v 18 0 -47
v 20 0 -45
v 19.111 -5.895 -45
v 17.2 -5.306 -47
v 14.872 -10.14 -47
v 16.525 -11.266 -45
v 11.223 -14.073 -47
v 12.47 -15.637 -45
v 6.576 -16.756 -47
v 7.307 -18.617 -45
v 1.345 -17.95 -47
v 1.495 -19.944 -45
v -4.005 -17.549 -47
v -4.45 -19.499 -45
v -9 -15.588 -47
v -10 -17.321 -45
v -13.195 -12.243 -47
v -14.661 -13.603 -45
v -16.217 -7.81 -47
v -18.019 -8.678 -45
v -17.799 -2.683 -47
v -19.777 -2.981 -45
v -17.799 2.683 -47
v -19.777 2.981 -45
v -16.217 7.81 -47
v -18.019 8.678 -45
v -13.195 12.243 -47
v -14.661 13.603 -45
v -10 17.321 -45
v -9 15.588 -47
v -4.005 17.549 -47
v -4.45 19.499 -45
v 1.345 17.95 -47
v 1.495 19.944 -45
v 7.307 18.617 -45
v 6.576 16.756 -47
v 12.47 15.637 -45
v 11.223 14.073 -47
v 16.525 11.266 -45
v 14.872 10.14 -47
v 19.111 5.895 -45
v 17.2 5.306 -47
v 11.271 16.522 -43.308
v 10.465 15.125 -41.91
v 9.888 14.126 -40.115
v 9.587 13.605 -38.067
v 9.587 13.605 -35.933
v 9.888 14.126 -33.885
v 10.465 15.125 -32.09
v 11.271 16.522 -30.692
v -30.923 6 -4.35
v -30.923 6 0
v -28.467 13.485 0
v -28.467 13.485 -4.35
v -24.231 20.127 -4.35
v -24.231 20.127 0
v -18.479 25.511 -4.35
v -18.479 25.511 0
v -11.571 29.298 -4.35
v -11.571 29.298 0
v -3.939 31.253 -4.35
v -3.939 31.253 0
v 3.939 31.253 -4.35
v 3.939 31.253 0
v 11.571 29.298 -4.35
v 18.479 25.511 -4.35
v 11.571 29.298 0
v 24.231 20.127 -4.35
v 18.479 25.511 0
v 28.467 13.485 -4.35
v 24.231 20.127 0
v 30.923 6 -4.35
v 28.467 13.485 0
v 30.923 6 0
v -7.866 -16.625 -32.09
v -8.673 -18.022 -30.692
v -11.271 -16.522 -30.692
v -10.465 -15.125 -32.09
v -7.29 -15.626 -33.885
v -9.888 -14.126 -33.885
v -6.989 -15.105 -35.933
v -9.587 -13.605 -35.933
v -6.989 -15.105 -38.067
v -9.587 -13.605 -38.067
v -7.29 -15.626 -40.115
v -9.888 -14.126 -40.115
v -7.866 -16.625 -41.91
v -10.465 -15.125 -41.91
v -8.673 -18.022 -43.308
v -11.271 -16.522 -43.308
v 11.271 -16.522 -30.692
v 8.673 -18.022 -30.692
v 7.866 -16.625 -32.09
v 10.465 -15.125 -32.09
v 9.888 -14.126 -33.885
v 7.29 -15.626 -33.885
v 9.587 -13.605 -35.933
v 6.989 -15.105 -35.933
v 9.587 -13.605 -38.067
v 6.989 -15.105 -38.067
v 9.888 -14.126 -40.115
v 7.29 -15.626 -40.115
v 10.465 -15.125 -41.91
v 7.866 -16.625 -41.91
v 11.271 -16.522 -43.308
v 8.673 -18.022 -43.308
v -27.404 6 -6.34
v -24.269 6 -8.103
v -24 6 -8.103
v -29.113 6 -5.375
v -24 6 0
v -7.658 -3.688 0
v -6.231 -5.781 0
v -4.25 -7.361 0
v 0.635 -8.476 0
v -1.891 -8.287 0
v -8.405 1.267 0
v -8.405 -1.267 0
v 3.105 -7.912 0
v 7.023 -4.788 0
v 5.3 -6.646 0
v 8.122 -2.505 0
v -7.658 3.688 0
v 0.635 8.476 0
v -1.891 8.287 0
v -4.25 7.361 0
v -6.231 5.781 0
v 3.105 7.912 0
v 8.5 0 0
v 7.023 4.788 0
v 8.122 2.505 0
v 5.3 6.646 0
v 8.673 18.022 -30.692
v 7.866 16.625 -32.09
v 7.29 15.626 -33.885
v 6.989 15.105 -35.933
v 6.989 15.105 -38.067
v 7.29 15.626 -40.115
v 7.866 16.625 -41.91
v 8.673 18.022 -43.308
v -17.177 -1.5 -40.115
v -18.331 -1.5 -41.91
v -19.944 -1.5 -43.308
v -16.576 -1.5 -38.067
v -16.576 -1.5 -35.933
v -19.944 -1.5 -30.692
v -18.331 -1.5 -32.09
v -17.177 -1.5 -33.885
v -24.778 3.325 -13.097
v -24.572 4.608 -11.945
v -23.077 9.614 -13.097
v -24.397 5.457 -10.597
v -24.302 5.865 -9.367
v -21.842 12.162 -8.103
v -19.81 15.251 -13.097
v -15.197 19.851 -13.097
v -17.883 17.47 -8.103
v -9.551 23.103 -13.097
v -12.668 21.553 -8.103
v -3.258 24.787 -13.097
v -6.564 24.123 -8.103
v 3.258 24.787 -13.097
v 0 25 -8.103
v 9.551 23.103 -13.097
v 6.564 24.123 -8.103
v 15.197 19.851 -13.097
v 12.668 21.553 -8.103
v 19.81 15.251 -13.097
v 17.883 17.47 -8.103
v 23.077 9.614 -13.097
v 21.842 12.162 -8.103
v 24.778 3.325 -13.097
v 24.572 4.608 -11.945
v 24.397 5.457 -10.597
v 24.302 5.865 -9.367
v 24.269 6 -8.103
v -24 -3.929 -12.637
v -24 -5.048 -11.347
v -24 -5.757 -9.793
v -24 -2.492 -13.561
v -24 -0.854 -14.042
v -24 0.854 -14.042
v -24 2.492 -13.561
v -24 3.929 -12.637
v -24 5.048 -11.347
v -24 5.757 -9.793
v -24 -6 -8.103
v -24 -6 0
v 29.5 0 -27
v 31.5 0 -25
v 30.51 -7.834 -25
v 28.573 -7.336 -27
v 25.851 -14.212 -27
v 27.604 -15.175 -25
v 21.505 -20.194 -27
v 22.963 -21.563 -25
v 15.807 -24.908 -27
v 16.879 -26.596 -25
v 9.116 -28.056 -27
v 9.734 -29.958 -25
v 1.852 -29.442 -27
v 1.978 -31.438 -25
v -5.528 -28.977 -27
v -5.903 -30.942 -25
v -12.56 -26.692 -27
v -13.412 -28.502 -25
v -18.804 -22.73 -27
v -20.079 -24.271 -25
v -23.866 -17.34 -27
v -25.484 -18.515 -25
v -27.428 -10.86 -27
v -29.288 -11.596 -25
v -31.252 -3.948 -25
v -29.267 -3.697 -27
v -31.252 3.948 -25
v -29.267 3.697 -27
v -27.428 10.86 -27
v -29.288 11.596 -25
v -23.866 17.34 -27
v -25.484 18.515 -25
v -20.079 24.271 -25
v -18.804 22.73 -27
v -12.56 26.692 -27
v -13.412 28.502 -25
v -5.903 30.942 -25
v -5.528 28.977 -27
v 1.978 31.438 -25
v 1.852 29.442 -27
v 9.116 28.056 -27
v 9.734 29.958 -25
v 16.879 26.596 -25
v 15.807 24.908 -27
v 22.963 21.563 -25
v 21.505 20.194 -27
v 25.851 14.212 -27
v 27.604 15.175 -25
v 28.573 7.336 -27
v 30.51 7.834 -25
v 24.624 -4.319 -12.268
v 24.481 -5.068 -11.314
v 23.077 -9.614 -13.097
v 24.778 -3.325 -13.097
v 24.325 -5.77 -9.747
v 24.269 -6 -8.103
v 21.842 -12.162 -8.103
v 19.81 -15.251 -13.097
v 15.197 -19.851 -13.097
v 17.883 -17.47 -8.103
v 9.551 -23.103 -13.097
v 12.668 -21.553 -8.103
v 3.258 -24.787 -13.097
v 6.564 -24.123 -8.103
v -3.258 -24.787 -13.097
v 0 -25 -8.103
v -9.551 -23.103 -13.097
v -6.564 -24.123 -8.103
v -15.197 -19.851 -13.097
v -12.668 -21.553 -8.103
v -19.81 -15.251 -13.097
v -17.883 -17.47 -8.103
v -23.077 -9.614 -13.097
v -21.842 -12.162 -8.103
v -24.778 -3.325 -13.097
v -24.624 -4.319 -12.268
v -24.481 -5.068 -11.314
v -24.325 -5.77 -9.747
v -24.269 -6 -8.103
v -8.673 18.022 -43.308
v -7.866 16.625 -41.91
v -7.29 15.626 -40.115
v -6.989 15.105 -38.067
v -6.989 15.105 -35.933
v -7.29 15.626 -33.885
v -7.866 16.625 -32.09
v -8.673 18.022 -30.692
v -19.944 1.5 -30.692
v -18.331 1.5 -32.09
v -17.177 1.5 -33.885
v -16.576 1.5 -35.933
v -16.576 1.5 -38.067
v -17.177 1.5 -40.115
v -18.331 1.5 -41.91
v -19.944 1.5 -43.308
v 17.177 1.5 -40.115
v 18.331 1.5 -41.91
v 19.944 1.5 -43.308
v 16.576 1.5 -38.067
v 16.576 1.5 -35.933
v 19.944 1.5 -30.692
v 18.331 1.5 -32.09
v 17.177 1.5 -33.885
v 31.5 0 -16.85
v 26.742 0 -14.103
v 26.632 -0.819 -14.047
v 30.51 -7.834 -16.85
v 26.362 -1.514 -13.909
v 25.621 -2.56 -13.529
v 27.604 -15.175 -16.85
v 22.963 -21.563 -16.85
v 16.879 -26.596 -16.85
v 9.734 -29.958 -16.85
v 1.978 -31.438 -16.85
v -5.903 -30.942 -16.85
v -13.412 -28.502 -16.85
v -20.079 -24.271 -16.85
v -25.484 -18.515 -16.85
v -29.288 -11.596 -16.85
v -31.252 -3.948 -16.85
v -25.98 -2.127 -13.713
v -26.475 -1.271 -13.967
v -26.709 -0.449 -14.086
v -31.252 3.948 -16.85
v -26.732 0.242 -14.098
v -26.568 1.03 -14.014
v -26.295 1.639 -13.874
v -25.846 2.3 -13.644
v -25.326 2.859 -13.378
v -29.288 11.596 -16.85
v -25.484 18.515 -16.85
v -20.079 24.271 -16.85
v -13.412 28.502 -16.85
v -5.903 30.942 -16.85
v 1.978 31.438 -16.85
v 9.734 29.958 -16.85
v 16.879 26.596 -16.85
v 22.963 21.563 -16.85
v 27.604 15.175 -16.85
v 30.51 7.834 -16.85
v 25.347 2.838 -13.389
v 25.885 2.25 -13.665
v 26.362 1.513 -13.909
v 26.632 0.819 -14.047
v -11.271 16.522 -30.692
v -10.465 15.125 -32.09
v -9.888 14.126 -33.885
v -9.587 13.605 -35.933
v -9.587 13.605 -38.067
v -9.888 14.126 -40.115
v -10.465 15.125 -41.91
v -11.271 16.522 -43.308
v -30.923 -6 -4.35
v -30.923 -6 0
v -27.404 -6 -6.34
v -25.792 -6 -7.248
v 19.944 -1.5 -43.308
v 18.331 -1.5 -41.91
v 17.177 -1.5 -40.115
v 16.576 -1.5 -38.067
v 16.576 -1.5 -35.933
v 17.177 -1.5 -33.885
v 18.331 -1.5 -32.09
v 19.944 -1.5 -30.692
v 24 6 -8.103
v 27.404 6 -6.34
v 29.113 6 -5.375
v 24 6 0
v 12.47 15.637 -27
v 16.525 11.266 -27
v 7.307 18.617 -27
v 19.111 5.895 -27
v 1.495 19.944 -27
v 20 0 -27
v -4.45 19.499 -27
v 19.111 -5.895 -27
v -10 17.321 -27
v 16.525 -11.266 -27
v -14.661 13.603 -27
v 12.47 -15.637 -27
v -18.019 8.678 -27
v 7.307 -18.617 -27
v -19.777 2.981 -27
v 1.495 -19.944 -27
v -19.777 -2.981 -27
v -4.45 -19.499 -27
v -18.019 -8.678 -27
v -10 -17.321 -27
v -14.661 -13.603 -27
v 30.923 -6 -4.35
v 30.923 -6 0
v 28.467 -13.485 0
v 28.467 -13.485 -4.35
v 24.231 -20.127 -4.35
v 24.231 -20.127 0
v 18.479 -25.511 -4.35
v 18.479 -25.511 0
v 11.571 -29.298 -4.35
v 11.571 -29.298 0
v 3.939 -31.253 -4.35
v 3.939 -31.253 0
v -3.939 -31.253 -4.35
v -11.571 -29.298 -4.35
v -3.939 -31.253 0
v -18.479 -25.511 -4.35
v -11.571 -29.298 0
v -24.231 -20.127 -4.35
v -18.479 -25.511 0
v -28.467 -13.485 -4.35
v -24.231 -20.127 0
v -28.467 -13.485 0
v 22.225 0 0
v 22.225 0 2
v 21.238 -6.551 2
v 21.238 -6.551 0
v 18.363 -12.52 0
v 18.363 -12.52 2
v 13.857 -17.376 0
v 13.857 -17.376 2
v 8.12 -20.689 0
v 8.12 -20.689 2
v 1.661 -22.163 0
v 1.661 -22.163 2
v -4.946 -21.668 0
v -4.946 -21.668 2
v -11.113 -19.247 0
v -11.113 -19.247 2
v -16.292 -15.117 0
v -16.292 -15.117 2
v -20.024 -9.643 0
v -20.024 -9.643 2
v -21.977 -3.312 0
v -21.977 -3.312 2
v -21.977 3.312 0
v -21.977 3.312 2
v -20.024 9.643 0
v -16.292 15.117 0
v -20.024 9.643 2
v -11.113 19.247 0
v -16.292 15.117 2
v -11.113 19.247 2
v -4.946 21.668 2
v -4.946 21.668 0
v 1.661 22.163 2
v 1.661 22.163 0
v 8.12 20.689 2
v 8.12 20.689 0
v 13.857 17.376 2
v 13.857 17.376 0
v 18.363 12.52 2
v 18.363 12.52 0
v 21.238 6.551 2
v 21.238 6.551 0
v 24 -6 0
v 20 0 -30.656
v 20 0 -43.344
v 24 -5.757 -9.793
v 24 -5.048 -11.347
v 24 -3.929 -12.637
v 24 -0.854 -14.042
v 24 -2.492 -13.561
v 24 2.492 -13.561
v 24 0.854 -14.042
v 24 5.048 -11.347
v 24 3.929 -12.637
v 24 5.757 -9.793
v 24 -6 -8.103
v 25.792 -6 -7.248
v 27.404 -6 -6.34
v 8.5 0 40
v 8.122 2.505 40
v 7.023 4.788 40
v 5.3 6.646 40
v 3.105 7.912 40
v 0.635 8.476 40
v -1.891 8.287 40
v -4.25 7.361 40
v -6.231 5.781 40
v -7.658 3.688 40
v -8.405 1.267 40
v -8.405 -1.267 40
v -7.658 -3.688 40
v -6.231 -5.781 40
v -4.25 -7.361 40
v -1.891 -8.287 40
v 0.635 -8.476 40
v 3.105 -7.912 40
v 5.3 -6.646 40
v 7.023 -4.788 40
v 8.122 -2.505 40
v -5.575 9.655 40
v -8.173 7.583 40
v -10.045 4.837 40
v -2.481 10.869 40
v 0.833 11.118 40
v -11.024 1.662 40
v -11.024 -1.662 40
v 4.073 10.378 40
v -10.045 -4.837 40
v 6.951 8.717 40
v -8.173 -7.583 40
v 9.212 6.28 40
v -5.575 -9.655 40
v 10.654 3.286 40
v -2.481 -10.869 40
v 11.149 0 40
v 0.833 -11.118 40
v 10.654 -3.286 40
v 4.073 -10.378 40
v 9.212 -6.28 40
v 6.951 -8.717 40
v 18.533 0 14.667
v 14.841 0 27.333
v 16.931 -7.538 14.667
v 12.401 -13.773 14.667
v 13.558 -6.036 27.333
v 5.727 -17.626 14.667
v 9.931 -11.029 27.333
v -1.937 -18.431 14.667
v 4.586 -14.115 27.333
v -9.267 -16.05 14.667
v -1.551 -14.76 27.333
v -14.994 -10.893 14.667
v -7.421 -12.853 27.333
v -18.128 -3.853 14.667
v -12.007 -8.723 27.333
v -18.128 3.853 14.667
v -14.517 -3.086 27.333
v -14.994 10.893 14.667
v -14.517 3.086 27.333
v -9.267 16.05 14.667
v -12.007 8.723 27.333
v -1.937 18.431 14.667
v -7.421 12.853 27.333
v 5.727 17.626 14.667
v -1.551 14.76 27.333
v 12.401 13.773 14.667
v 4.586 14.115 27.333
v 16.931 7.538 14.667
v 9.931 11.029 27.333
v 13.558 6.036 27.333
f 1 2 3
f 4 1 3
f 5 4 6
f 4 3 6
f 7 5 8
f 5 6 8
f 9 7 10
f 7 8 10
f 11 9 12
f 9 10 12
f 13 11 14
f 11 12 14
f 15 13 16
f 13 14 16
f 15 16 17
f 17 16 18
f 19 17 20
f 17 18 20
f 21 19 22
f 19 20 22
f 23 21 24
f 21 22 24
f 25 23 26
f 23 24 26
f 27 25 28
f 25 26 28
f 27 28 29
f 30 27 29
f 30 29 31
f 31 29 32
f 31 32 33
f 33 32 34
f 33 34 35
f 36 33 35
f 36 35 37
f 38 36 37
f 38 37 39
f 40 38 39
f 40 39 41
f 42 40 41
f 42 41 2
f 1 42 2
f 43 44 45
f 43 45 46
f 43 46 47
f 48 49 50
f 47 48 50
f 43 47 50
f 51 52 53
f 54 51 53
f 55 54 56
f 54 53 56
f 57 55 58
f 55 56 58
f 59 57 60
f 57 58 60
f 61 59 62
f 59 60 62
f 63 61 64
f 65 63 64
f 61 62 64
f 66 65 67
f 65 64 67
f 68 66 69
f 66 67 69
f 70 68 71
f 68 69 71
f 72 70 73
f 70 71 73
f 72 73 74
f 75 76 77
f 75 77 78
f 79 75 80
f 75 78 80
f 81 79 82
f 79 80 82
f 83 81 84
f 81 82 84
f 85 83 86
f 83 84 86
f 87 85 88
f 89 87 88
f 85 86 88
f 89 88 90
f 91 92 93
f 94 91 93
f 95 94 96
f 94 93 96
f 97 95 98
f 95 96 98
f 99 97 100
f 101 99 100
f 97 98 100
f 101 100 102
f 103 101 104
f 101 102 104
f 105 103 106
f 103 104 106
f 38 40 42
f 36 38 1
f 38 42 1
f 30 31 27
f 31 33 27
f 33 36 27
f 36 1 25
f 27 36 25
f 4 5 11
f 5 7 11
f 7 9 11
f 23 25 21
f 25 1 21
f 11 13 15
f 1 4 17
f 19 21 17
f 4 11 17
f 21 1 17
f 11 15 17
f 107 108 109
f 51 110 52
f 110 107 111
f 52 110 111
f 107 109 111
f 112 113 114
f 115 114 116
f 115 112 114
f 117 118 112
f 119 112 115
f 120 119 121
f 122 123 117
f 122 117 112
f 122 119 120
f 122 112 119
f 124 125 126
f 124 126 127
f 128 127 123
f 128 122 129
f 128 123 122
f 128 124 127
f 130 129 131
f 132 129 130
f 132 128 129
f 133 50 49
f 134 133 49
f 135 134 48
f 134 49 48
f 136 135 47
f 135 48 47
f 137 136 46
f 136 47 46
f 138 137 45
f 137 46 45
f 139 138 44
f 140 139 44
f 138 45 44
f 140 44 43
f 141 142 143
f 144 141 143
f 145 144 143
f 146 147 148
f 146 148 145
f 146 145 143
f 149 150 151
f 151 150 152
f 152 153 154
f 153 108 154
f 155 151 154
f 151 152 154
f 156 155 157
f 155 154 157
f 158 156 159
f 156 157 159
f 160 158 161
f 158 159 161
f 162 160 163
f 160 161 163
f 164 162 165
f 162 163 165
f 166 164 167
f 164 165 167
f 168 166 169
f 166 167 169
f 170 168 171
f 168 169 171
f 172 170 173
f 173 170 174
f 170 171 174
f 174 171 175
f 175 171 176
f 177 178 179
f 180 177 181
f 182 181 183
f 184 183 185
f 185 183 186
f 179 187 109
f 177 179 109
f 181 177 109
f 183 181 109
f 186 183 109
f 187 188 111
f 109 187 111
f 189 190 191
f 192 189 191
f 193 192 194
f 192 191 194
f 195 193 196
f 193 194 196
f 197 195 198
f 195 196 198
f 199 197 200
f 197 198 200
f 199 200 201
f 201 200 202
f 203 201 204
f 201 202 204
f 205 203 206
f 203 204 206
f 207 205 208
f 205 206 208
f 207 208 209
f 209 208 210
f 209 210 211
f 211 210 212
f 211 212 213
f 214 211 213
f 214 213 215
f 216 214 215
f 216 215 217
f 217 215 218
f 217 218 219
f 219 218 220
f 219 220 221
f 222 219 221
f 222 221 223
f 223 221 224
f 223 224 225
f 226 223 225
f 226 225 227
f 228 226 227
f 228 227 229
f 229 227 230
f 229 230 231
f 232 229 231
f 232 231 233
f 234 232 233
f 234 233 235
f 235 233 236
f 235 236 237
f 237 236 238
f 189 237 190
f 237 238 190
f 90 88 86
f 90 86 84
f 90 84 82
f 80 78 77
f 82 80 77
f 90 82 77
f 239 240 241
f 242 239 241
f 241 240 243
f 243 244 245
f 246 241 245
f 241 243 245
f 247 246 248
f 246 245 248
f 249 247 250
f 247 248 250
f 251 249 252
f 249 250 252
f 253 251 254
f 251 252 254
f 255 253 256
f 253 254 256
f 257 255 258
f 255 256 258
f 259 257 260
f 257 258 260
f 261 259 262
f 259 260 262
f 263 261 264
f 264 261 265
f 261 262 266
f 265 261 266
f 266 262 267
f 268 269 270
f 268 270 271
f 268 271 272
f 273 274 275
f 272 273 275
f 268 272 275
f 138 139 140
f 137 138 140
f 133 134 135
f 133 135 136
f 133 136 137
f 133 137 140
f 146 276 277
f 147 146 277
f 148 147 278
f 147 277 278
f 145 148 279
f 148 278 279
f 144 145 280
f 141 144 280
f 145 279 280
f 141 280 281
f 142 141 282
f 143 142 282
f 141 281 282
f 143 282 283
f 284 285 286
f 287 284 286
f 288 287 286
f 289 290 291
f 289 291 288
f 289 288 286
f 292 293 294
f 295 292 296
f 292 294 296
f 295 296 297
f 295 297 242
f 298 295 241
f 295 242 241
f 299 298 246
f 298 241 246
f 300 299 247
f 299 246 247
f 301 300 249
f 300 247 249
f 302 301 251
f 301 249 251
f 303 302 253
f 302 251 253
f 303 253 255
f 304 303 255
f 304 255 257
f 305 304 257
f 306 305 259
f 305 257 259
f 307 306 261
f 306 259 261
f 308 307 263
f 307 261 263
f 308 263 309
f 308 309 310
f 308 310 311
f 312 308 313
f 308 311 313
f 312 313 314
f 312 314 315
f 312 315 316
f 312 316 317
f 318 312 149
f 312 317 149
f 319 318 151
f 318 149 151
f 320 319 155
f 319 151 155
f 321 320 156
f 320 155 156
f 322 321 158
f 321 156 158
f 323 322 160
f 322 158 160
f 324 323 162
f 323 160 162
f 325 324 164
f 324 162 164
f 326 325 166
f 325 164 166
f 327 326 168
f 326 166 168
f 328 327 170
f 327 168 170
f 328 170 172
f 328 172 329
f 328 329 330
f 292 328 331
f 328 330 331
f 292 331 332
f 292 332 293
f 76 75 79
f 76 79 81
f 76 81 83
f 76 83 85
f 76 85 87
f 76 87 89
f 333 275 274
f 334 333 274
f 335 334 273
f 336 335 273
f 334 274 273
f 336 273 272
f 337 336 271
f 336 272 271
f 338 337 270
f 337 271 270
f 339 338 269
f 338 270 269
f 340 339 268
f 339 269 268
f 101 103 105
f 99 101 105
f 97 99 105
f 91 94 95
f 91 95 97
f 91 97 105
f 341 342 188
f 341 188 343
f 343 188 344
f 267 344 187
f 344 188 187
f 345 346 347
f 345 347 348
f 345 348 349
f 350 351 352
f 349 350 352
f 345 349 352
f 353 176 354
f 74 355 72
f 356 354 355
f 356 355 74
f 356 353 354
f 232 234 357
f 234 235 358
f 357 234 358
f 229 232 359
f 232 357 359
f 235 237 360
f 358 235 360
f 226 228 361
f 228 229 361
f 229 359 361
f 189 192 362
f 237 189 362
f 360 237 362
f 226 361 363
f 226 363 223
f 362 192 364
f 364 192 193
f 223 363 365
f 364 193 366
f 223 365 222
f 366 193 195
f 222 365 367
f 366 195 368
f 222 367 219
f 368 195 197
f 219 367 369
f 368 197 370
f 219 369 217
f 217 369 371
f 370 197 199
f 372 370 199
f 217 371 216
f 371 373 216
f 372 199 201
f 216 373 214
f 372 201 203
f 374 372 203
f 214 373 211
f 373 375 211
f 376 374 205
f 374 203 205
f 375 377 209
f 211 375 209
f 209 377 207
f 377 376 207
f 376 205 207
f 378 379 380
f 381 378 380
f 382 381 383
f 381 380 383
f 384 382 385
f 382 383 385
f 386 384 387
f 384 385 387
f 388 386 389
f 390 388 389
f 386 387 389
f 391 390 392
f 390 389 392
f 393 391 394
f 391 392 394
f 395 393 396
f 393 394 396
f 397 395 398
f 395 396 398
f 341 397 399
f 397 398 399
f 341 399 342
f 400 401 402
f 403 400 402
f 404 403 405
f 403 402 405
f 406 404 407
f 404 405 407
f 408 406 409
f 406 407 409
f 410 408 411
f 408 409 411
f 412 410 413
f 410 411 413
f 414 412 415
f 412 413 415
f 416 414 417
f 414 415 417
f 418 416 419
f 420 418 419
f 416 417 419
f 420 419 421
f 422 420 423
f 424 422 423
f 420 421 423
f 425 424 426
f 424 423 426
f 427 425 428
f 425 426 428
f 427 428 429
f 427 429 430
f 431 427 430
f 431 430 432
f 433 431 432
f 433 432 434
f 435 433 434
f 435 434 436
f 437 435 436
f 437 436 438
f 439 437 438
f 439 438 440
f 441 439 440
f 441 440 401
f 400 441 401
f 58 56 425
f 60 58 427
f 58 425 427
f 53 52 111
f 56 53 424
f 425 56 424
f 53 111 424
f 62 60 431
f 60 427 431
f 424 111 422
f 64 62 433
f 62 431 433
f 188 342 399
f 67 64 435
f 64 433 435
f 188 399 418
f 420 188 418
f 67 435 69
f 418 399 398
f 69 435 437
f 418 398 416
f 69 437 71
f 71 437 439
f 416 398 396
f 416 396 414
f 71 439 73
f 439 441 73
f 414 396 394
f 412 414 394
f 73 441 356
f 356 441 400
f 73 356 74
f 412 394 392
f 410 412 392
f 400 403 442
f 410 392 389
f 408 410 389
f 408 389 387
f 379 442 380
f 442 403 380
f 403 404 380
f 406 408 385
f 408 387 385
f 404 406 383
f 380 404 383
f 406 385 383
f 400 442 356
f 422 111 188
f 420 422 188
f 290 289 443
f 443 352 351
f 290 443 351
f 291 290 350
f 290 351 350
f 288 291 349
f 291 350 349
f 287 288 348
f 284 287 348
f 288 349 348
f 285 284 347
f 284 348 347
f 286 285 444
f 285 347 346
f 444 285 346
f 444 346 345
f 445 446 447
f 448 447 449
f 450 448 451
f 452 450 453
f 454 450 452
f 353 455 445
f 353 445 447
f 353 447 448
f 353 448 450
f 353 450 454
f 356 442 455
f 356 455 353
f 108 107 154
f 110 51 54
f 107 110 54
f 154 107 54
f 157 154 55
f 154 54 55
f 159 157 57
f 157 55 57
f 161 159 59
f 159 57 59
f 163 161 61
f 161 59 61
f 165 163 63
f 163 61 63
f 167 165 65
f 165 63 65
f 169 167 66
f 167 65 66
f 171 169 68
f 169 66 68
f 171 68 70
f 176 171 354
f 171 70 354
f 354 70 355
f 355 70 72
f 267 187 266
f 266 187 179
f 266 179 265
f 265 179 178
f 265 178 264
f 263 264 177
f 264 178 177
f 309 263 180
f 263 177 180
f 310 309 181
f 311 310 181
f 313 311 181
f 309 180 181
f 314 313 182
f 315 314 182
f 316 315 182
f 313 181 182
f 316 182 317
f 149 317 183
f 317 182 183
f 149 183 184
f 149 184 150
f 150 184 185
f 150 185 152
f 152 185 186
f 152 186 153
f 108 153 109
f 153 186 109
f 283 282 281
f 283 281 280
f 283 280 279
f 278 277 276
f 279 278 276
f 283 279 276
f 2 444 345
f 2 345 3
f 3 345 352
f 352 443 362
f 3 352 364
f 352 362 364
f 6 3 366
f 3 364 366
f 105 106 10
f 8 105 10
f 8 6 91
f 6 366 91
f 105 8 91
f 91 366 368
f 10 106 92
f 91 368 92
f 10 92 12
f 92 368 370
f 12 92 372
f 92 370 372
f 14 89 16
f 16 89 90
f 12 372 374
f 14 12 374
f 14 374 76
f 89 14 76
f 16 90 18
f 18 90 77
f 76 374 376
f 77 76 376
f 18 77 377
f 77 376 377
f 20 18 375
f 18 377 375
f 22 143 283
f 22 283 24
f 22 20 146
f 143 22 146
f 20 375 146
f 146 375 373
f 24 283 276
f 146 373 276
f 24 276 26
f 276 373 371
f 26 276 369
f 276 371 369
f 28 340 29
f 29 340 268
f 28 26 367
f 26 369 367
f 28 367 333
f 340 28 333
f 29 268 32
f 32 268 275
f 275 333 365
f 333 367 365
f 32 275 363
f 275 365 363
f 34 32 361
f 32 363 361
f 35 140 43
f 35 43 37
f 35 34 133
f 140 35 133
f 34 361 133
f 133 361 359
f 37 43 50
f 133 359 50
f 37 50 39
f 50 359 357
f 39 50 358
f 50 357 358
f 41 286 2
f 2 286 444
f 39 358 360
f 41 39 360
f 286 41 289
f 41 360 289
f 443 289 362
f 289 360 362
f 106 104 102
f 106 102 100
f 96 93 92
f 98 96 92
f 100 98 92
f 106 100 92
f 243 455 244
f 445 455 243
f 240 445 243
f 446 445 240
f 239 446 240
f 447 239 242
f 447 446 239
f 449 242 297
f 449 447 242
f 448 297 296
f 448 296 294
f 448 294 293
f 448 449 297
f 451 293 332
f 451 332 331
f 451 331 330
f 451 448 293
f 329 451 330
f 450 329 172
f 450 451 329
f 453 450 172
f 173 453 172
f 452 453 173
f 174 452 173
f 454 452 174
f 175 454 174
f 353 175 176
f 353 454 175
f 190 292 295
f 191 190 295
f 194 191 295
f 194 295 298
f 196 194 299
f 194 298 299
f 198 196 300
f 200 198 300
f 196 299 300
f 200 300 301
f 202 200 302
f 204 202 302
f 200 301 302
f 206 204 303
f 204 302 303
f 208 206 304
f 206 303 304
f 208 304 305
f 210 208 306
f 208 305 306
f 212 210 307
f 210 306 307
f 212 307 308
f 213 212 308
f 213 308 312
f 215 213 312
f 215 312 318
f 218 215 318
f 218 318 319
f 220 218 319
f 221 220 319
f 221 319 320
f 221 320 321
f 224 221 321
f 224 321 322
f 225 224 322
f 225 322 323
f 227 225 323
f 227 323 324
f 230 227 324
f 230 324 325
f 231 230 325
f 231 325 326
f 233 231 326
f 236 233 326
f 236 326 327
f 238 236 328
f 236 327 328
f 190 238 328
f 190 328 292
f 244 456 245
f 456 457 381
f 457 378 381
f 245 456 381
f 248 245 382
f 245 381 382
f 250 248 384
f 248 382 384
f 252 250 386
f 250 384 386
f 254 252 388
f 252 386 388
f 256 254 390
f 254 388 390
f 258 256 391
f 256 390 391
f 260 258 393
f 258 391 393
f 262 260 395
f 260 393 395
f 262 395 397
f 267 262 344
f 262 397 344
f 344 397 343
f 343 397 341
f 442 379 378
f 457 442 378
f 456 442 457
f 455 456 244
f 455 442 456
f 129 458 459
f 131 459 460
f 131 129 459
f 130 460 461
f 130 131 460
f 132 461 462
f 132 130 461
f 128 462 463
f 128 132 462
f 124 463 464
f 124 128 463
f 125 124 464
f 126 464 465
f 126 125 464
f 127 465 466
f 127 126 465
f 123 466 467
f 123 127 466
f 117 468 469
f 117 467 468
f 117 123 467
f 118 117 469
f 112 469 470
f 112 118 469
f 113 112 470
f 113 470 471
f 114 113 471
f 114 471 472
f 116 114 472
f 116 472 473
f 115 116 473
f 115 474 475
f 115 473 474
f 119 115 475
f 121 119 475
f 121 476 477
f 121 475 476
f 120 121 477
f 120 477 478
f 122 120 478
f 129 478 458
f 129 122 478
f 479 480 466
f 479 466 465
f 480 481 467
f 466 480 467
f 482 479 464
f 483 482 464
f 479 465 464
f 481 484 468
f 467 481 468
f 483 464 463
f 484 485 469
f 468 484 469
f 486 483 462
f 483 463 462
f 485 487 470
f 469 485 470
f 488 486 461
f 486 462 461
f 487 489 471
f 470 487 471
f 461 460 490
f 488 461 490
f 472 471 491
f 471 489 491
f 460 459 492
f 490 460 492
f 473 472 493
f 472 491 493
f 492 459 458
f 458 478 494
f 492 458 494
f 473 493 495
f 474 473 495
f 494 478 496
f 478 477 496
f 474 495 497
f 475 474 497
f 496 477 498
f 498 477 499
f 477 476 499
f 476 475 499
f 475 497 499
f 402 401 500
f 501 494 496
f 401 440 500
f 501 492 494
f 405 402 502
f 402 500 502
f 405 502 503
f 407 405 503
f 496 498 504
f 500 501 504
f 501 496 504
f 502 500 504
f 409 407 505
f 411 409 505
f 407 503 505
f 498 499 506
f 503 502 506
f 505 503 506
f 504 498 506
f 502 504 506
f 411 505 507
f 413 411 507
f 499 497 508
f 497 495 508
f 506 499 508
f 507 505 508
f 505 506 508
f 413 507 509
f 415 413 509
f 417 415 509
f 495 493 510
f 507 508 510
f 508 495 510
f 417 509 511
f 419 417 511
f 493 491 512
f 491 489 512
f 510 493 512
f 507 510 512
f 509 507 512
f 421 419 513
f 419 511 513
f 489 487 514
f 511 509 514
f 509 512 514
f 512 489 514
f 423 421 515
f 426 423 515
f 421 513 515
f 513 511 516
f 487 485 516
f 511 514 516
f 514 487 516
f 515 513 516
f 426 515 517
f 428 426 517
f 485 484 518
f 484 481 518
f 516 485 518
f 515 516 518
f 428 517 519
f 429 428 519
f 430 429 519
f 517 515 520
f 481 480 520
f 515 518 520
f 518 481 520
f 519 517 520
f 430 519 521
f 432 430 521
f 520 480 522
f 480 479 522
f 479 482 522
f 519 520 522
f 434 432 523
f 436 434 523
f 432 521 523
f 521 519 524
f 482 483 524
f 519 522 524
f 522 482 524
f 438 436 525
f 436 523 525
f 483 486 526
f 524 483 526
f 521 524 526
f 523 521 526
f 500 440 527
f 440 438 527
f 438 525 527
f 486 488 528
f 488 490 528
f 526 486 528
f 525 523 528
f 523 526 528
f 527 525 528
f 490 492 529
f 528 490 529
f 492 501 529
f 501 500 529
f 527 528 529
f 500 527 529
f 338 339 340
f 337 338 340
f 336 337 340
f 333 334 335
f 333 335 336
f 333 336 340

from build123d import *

# Parameters (mm, degrees)
F0_W            = 25
F0_H            = 4.9944465005
F0_W_2          = 20
F0_H_2          = 20
F2_SIZE         = 2
F5_DEPTH        = 63.5294467211
F7_R            = 7.5
F8_DEPTH        = 1.5
F8_COPIES_COUNT = 6
F9_R            = 8.5
F10_DEPTH       = 89.8396968842


# Not quite as in the source:
# - a pattern or mirror of a feature is missing from the dataset's text; its kind, count and spacing are read off the source's solid


with BuildPart() as f1:
    # F0 (on Front) → F1 (revolve)
    with BuildSketch(Plane.XZ):
        Polygon((0, 40), (0, 0), (22.225, 0), (22.225, 2), (11.1490100557, 40), align=None)
        Polygon((22.225, 0), (0, 0), (0, -4.35), (31.5, -4.35), (31.5, 0), align=None)
        Polygon((31.5, -4.35), (0, -4.35), (0, -8.1027767497), (25, -8.1027767497), align=None)
        with Locations((12.5, -10.6)):
            Rectangle(F0_W, F0_H)
        Polygon((25, -13.0972232503), (0, -13.0972232503), (0, -16.85), (31.5, -16.85), align=None)
        Polygon((31.5, -16.85), (0, -16.85), (0, -27), (20, -27), (31.5, -27), align=None)
        with Locations((10, -37)):
            Rectangle(F0_W_2, F0_H_2)
    revolve(axis=Axis((0, 0, -0.6091467625), (0, 0, -1)))

    # F2
    f2_edges = [f1.edges().sort_by_distance(p)[0] for p in [
        (-31.5, 0, -27),
        (-20, 0, -47),
    ]]
    chamfer(f2_edges, length=F2_SIZE)

    # F4 (on offset) → F5 (cut)
    with BuildSketch(Plane.YZ.offset(24)):
        with BuildLine():
            ThreePointArc((-6, -8.1027767497), (0, -14.1027767497), (6, -8.1027767497))
            ThreePointArc((6, -8.1027767497), (0, -2.1027767497), (-6, -8.1027767497))
        make_face()
        with BuildLine():
            ThreePointArc((-6, -8.1027767497), (0, -2.1027767497), (6, -8.1027767497))
            Line((6, -8.1027767497), (6, 0))
            Line((6, 0), (-6, 0))
            Line((-6, 0), (-6, -8.1027767497))
        make_face()
    extrude(amount=F5_DEPTH, mode=Mode.SUBTRACT)

    # F6: F1 across plane


with BuildPart() as f1_1:
    add(f1.part)
    add(f1.part.mirror(Plane.YZ), mode=Mode.INTERSECT)

    # F7 (on Front) → F8 (cut, symmetric)
    with BuildSketch(Plane.XZ):
        with Locations((24, -37)):
            Circle(F7_R)
    f8 = extrude(amount=F8_DEPTH, both=True, mode=Mode.SUBTRACT)

    # F8_copies: F8 ×6 about axis
    f8_copies_axis = Axis((0, 0, 0), (0, 0, 1))
    for i in range(1, F8_COPIES_COUNT):
        add(f8.rotate(f8_copies_axis, i * 360 / F8_COPIES_COUNT), mode=Mode.SUBTRACT)

    # F9 (on Top) → F10 (cut)
    with BuildSketch(Plane.XY):
        Circle(F9_R)
    extrude(amount=F10_DEPTH, mode=Mode.SUBTRACT)


solid = f1_1.part
